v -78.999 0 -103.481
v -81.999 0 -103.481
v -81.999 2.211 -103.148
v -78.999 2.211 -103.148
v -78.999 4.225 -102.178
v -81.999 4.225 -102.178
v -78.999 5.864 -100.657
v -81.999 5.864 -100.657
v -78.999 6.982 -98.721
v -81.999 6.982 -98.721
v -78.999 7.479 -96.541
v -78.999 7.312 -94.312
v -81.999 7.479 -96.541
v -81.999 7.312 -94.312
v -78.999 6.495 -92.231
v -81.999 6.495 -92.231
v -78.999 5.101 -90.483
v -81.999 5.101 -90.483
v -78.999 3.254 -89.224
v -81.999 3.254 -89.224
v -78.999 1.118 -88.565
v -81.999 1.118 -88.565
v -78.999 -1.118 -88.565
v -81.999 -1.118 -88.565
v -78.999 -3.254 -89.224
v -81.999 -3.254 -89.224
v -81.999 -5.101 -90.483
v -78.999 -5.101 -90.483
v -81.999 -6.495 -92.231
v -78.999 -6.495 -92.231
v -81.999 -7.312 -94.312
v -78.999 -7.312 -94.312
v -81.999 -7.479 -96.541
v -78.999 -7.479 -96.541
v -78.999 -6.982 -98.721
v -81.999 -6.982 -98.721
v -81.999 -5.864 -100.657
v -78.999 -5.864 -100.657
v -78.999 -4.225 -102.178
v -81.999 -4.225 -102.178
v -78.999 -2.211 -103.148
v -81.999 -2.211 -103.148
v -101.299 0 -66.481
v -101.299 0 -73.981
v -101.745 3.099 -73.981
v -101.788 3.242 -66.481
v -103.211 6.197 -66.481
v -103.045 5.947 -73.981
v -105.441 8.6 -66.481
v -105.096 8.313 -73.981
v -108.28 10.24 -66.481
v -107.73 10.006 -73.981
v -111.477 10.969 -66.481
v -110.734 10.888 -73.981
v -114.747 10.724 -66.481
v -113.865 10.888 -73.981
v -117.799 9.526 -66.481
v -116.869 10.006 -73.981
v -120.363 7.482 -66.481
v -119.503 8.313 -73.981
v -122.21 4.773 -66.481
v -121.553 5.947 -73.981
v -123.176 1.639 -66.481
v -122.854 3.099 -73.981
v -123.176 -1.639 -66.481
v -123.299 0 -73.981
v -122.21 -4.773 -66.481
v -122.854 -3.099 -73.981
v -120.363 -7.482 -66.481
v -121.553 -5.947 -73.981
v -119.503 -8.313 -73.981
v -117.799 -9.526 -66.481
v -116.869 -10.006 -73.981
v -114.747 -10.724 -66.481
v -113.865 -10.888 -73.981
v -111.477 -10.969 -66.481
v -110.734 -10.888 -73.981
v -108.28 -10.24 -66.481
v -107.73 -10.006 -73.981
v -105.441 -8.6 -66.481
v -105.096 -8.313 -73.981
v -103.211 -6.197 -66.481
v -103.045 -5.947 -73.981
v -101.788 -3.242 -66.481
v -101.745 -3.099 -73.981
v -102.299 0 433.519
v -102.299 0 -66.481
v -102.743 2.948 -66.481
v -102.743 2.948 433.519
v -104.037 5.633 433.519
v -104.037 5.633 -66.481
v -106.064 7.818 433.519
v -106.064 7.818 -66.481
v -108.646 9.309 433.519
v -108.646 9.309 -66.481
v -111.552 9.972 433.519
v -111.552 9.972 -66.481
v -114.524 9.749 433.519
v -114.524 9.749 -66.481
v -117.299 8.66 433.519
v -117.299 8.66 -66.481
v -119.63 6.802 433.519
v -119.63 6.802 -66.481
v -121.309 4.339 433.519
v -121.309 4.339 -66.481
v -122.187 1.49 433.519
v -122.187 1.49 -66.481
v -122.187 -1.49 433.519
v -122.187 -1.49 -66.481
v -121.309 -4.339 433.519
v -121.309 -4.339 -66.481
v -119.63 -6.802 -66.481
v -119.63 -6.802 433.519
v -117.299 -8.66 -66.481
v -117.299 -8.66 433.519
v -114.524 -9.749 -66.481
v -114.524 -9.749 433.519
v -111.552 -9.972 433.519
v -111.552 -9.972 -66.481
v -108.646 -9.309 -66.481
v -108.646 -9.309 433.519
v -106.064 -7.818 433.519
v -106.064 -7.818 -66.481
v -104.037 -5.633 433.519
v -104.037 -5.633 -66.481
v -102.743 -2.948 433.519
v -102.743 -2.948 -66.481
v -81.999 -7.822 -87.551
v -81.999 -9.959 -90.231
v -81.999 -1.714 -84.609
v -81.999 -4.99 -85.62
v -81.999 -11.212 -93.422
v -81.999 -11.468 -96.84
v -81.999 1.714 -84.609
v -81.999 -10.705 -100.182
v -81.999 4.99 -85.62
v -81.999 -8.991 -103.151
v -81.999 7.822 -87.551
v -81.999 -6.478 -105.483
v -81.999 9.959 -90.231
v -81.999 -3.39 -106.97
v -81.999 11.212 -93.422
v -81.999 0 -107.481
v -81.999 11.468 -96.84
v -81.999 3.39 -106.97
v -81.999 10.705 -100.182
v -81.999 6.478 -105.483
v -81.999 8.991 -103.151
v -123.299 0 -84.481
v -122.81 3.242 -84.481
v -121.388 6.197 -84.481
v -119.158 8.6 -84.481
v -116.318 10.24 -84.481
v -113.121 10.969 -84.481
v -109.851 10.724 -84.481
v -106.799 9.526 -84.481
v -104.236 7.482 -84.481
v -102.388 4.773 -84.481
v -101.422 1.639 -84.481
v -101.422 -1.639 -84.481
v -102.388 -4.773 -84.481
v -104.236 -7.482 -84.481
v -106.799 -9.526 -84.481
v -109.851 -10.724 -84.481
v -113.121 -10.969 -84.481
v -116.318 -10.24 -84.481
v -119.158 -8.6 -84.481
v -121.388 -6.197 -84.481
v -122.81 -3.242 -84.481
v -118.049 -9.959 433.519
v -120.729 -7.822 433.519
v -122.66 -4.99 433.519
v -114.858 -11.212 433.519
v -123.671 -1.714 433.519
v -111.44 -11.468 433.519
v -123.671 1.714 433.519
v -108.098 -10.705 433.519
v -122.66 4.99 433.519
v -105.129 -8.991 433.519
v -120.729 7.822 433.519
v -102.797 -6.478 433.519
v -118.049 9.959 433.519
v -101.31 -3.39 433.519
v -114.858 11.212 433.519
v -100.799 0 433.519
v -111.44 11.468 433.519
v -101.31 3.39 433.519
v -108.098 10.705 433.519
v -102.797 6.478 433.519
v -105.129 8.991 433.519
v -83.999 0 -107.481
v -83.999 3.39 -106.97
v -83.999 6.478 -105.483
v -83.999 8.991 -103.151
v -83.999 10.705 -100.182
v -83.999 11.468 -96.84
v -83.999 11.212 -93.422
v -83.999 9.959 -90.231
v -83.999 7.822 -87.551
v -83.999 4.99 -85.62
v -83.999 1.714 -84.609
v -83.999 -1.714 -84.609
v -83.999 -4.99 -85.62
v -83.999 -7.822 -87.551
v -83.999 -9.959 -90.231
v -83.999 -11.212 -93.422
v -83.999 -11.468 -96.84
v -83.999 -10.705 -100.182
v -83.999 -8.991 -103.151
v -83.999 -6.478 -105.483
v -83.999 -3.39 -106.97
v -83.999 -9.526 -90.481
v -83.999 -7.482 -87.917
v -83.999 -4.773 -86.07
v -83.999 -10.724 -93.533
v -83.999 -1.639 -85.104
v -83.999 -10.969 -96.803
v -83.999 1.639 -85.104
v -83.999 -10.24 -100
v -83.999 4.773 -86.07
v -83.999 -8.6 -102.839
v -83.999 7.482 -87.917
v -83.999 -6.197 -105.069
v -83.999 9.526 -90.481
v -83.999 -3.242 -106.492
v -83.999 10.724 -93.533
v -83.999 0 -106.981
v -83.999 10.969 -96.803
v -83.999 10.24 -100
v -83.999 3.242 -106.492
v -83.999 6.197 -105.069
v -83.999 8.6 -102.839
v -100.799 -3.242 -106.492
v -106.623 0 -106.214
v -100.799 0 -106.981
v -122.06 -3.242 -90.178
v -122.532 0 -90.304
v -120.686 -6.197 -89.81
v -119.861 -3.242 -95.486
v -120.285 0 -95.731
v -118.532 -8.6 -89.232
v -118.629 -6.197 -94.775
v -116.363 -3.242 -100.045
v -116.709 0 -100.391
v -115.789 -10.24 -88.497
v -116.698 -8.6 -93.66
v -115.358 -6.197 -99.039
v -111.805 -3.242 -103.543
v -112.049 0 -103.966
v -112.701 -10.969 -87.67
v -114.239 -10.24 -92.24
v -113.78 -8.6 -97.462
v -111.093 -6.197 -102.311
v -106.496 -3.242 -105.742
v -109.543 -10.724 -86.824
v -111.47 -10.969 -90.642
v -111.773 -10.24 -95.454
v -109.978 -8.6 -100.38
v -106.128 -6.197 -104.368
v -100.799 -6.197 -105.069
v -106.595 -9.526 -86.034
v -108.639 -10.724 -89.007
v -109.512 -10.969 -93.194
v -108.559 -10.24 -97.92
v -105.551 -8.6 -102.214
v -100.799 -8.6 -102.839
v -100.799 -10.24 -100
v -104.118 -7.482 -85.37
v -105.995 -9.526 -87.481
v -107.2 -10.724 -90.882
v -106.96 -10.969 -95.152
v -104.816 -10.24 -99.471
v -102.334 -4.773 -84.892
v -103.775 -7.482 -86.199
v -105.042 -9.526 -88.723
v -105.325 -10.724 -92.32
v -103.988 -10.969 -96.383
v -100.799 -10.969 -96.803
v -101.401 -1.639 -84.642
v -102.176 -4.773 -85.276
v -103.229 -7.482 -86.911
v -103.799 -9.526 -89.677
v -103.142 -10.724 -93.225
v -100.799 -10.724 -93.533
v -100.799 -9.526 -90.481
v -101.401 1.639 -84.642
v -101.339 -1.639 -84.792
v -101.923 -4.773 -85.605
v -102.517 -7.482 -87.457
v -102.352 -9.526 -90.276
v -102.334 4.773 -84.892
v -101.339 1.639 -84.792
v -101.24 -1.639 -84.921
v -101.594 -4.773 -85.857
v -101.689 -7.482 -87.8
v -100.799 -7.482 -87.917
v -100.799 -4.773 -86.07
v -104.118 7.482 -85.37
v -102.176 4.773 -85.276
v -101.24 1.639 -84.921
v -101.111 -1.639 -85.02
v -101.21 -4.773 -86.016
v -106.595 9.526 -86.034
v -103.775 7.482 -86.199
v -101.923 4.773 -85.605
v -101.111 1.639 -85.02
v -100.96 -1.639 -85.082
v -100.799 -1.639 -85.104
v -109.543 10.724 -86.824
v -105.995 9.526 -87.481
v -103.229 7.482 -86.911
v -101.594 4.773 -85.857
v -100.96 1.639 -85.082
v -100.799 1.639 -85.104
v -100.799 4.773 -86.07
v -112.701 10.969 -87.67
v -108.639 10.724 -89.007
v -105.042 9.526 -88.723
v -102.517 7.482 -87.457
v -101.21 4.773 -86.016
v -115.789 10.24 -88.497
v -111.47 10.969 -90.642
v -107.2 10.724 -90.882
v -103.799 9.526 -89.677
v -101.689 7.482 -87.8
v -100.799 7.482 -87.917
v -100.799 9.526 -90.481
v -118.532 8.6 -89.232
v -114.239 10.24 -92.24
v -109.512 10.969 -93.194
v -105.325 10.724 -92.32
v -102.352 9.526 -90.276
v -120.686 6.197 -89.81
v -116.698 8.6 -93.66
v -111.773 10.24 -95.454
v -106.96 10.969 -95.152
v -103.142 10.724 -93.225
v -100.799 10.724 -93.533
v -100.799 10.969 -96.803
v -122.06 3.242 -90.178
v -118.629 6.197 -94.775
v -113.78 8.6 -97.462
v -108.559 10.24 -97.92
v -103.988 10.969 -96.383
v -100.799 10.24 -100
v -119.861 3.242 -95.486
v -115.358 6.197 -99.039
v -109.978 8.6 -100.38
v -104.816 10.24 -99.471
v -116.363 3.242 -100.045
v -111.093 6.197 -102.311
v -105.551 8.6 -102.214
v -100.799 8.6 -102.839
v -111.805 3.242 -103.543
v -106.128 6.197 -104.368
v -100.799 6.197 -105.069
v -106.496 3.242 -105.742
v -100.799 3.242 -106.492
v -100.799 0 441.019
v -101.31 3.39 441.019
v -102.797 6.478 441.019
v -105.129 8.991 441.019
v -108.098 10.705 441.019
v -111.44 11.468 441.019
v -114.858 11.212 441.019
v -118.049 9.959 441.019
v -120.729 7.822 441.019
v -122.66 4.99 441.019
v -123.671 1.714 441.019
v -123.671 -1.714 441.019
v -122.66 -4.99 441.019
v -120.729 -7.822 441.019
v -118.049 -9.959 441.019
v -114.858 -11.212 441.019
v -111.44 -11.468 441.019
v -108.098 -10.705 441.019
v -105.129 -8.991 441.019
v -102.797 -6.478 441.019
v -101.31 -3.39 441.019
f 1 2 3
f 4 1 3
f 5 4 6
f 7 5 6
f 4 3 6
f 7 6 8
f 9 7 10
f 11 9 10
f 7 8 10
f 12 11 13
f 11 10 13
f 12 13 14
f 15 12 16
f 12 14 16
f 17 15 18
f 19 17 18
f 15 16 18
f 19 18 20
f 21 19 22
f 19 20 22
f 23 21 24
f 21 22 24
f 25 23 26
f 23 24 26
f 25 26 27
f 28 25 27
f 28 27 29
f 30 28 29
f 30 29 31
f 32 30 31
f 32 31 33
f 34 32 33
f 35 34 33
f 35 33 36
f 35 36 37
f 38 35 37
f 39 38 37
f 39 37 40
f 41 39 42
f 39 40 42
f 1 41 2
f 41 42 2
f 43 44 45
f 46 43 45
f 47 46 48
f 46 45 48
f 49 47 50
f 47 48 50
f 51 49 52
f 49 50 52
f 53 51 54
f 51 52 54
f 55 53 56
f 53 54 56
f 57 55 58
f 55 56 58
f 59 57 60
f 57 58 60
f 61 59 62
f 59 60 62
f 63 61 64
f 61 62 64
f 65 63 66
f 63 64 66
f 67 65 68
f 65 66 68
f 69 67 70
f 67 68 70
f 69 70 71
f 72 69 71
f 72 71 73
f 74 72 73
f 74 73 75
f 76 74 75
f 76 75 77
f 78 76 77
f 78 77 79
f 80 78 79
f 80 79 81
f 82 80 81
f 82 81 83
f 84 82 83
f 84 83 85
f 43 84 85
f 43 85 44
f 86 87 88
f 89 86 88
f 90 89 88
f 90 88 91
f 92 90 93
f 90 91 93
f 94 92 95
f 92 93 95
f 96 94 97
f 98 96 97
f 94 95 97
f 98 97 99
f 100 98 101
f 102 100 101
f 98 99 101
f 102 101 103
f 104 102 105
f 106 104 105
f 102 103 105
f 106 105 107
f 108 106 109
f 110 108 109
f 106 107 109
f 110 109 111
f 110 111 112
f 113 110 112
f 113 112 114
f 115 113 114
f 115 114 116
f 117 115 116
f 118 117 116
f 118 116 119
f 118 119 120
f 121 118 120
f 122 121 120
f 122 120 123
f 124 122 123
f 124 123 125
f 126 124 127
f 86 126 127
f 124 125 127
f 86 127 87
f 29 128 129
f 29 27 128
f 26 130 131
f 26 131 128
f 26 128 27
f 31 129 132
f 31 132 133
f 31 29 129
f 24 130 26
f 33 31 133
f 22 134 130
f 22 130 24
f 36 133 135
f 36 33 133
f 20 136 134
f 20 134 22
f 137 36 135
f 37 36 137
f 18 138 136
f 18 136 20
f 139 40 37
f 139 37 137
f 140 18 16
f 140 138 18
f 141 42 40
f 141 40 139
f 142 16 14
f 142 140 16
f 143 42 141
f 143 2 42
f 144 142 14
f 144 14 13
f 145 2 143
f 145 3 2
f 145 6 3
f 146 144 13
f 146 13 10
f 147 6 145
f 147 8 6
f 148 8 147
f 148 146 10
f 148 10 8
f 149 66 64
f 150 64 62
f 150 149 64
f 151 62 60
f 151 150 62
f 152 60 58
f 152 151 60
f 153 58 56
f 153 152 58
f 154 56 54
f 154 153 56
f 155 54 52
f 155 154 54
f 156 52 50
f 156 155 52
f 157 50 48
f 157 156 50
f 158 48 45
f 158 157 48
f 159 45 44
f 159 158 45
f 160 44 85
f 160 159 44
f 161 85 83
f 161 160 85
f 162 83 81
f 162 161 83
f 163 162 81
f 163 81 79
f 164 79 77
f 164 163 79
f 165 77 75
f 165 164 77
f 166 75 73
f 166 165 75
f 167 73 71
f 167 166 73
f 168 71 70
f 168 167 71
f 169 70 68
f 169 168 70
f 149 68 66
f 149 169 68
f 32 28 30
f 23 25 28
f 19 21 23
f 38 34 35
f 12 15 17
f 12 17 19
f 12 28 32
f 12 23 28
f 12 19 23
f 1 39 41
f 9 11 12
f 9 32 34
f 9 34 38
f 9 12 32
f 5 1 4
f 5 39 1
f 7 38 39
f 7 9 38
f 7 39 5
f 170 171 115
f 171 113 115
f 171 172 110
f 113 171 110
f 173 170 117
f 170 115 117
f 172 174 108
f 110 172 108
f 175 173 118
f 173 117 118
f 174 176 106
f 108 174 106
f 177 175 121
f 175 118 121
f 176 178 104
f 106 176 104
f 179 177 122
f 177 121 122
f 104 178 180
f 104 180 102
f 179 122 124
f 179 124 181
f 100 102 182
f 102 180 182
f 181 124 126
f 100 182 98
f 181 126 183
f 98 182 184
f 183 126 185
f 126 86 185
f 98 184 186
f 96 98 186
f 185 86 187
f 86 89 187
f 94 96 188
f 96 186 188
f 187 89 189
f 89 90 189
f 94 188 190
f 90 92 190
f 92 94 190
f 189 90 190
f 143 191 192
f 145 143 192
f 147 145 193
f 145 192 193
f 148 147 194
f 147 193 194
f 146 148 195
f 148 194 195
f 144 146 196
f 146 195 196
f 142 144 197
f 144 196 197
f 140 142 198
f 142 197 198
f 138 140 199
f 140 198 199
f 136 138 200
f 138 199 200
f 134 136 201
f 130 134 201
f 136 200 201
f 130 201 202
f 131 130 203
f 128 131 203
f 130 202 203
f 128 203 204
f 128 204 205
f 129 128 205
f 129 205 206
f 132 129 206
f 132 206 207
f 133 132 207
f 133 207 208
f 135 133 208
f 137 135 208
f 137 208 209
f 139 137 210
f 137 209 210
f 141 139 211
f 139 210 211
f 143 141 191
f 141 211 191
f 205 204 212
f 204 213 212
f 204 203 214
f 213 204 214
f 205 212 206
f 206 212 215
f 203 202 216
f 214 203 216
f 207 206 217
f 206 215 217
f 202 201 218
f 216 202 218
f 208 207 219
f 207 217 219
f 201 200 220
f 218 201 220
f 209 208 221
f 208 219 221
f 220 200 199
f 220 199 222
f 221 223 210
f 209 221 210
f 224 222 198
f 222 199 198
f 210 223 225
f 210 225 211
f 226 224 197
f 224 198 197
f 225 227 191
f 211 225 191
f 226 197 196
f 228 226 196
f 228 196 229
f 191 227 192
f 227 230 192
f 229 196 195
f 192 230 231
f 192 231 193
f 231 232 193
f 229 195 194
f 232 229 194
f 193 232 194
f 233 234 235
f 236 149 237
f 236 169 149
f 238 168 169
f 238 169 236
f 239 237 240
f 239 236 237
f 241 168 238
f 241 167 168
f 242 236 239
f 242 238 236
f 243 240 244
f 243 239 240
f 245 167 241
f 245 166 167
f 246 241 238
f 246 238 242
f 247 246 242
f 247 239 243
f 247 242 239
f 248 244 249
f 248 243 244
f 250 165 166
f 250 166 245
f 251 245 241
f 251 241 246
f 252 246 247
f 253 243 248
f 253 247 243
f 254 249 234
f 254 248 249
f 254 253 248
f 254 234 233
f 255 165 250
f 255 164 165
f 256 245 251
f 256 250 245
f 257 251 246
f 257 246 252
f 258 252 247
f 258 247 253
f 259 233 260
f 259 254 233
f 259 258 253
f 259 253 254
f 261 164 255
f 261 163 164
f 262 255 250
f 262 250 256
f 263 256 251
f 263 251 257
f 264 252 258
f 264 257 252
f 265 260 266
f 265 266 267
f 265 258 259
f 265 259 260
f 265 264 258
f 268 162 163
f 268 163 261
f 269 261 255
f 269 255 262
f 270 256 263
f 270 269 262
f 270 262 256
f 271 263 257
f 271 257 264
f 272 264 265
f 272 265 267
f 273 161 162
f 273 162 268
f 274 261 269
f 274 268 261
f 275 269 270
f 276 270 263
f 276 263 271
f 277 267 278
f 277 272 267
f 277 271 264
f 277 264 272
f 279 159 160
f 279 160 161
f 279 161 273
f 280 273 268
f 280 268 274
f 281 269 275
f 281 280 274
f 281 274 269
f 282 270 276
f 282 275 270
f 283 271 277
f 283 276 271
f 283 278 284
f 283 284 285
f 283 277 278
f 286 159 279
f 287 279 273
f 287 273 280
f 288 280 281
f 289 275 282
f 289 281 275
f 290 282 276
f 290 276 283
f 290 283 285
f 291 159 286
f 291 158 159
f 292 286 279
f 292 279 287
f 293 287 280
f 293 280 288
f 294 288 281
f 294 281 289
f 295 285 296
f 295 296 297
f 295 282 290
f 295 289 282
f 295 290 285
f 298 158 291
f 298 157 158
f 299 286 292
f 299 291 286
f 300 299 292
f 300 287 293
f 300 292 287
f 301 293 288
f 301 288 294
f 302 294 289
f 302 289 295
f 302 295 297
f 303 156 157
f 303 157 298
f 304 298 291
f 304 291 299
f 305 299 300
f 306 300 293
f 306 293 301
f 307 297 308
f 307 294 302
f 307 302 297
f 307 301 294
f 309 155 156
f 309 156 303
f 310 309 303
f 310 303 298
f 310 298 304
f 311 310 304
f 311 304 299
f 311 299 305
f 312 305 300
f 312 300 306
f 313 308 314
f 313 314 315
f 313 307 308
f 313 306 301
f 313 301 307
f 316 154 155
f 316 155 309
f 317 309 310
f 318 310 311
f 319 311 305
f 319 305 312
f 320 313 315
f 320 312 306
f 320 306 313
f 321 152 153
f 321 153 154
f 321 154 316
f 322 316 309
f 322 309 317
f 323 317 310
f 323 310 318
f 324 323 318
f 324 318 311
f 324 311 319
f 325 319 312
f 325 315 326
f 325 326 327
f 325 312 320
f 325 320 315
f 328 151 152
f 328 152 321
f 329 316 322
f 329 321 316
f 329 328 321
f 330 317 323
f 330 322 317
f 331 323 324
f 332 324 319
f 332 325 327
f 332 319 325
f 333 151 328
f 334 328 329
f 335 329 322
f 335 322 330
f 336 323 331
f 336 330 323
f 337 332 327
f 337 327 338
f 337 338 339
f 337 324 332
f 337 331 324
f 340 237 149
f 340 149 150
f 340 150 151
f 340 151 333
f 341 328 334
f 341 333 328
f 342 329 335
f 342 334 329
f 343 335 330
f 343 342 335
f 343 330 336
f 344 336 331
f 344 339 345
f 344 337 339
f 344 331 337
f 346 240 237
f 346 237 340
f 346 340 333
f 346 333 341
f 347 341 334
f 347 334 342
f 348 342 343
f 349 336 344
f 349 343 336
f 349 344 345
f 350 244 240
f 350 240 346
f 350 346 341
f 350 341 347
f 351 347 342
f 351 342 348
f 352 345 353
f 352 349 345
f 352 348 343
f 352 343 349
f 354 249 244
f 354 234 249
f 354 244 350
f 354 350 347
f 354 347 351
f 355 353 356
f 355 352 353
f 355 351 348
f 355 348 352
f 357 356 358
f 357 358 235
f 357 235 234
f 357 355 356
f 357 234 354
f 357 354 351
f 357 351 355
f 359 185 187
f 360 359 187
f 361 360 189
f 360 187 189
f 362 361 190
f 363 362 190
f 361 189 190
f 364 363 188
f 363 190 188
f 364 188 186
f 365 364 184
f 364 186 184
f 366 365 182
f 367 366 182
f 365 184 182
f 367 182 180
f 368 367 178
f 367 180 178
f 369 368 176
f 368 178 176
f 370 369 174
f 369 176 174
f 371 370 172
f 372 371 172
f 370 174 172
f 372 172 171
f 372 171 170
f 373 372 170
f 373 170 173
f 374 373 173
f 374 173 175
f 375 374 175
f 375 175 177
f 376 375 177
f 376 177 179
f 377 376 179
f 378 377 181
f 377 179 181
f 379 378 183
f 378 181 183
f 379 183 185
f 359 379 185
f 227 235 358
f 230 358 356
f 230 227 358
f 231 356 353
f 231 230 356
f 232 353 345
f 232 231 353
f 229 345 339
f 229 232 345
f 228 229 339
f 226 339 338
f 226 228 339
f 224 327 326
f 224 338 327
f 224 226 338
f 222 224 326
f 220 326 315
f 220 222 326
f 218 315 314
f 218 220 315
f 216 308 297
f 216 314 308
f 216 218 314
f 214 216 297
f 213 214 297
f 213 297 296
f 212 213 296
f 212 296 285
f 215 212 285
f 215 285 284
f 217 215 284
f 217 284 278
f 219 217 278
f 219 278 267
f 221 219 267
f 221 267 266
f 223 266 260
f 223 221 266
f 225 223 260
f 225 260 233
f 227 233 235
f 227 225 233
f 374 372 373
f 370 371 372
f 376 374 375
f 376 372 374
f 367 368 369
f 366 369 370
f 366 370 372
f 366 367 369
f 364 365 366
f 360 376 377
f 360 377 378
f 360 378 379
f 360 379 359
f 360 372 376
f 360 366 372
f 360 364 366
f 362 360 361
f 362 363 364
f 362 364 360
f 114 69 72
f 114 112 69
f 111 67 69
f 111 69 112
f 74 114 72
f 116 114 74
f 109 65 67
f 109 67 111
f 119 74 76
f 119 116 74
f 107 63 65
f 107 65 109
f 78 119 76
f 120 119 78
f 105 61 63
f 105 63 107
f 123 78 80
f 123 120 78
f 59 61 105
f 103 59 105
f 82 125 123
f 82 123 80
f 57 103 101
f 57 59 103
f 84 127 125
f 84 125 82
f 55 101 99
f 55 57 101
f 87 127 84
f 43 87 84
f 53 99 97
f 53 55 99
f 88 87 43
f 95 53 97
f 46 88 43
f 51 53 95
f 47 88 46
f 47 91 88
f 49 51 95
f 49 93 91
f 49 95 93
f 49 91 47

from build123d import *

# Parameters (mm, degrees)
SWEEP1_PROFILE_R    = 11
SKETCH34_R          = 11
BOSS_EXTRUDE1_DEPTH = 7.5
SKETCH41_R          = 11.5
BOSS_EXTRUDE2_DEPTH = 2
SKETCH42_R          = 10
BOSS_EXTRUDE3_DEPTH = 500
SKETCH43_R          = 11.5
BOSS_EXTRUDE4_DEPTH = 7.5
SKETCH129_R         = 7.5
BOSS_EXTRUDE5_DEPTH = 3


with BuildPart() as part:
    # Sweep1: sweep along a path in Sketch1
    with BuildLine(Plane(origin=(0, 0, 0), x_dir=(1, 0, 0), z_dir=(0, 1, 0))) as sweep1_path:
        Line((-112.299146126, 73.980831747), (-112.299146126, 84.480831747))
        ThreePointArc((-112.299146126, 84.480831747), (-108.93087411, 92.612559731), (-100.799146126, 95.980831747))
        Line((-100.799146126, 95.980831747), (-83.999146126, 95.980831747))
    # Sweep1 profile (on start of the path) → Sweep1 (sweep)
    with BuildSketch(Plane(origin=(-112.299146126, 0, -73.980831747), x_dir=(-1, 0, 0), z_dir=(0, 0, -1))):
        Circle(SWEEP1_PROFILE_R)
    sweep(path=sweep1_path.line)

    # Sketch34 → Boss-Extrude1 (add)
    with BuildSketch(Plane.XY.offset(-73.980831747)):
        with Locations((-112.299146126, 0)):
            Circle(SKETCH34_R)
    extrude(amount=BOSS_EXTRUDE1_DEPTH)

    # Sketch41 → Boss-Extrude2 (add)
    with BuildSketch(Plane(origin=(-83.999146126, 0, 0), x_dir=(0, 0, -1), z_dir=(1, 0, 0))):
        with Locations((95.980831747, 0)):
            Circle(SKETCH41_R)
    extrude(amount=BOSS_EXTRUDE2_DEPTH)

    # Sketch42 → Boss-Extrude3 (add)
    with BuildSketch(Plane.XY.offset(-66.480831747)):
        with Locations((-112.299146126, 0)):
            Circle(SKETCH42_R)
    extrude(amount=BOSS_EXTRUDE3_DEPTH)

    # Sketch43 → Boss-Extrude4 (add)
    with BuildSketch(Plane.XY.offset(433.519168253)):
        with Locations((-112.299146126, 0)):
            Circle(SKETCH43_R)
    extrude(amount=BOSS_EXTRUDE4_DEPTH)

    # Sketch129 → Boss-Extrude5 (add)
    with BuildSketch(Plane(origin=(-81.999146126, 0, 0), x_dir=(0, 0, -1), z_dir=(1, 0, 0))):
        with Locations((95.980831747, 0)):
            Circle(SKETCH129_R)
    extrude(amount=BOSS_EXTRUDE5_DEPTH)


solid = part.part
